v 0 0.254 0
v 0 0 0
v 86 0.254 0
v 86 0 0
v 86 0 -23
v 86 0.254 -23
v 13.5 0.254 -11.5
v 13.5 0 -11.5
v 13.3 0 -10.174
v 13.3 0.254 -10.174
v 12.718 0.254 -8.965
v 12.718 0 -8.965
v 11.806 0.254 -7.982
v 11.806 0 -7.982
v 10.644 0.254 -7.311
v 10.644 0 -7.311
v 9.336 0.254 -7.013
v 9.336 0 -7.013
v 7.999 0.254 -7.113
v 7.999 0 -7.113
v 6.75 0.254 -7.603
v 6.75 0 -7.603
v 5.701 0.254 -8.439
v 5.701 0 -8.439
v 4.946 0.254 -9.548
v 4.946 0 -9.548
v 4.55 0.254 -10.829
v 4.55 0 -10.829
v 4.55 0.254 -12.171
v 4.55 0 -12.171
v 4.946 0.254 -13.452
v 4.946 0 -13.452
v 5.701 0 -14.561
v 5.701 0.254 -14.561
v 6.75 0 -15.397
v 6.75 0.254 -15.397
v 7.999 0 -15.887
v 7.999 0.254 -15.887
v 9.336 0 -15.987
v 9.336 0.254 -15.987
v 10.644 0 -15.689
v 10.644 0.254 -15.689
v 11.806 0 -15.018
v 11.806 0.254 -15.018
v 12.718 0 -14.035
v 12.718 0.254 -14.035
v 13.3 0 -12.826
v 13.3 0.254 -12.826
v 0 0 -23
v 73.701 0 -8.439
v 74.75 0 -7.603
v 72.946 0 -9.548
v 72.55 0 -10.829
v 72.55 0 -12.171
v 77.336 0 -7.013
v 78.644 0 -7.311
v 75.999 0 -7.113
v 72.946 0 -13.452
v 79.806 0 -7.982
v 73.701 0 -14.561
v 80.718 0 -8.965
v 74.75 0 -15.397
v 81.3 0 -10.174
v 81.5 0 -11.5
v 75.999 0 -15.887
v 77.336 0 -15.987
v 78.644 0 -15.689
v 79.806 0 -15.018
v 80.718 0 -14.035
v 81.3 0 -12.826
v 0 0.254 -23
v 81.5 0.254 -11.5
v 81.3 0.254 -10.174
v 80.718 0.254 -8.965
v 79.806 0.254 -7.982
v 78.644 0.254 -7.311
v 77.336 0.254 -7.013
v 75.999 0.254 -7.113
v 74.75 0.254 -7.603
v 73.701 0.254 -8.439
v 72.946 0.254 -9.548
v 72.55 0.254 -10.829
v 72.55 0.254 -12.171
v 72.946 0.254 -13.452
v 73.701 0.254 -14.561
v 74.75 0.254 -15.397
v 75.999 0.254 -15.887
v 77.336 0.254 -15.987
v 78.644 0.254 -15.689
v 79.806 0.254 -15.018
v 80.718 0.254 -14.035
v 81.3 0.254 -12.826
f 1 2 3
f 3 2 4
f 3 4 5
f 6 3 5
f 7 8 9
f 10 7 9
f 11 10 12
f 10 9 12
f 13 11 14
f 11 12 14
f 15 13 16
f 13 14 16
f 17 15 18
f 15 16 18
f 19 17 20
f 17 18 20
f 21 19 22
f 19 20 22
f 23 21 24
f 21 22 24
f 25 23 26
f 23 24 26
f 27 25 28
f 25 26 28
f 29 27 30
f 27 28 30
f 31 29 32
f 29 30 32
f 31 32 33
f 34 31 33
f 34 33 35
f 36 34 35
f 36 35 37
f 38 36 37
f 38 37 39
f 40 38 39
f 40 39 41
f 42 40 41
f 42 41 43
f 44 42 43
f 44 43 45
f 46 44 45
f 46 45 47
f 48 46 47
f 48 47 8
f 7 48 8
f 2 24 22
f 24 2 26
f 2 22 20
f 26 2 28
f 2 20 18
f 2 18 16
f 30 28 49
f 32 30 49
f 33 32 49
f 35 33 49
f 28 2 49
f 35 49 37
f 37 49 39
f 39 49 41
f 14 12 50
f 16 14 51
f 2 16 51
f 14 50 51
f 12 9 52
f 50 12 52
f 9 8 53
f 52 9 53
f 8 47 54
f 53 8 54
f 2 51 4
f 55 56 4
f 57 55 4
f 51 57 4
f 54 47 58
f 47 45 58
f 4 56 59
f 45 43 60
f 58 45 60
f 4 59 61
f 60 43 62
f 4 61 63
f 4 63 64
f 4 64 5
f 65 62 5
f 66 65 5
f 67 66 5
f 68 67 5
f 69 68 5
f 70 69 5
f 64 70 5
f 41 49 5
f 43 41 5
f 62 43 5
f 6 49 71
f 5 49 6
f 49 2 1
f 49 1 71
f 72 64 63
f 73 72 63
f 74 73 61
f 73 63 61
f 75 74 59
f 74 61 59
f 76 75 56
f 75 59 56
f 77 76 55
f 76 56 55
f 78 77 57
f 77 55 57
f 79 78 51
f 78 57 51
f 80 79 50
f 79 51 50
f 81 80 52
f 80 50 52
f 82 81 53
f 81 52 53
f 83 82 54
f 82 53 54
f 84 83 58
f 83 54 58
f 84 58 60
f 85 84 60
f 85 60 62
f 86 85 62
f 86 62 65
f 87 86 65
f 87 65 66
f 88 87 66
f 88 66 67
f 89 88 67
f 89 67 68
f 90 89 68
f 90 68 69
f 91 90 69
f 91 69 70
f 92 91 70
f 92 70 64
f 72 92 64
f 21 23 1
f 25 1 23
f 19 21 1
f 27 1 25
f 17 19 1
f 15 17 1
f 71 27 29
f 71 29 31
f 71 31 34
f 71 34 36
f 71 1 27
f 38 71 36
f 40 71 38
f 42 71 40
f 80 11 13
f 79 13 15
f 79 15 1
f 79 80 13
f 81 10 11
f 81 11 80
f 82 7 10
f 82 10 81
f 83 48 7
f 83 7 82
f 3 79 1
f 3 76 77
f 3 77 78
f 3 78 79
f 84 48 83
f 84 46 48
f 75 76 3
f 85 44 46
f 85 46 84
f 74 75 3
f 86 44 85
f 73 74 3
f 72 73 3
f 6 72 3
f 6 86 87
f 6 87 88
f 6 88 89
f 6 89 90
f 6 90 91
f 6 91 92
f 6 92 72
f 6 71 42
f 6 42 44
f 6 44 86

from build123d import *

# Parameters (mm, degrees)
SKETCH1_W                = 86
SKETCH1_H                = 23
EXTRUDE1_DEPTH           = 0.254
F_9_0_9_DIAMETER_HOLE1_D = 9


with BuildPart() as part:
    # Sketch1 → Extrude1 (new body)
    with BuildSketch(Plane(origin=(0, 0, 0), x_dir=(1, 0, 0), z_dir=(0, 1, 0))):
        with Locations((43, 11.5)):
            Rectangle(SKETCH1_W, SKETCH1_H)
    extrude(amount=EXTRUDE1_DEPTH)

    # Ø9.0 (9) Diameter Hole1 (through all)
    with Locations(Plane(origin=(0, 0.254, 0), x_dir=(-1, 0, 0), z_dir=(0, 1, 0))):
        with Locations((-9, -11.5), (-77, -11.5)):
            Hole(F_9_0_9_DIAMETER_HOLE1_D / 2)


solid = part.part
